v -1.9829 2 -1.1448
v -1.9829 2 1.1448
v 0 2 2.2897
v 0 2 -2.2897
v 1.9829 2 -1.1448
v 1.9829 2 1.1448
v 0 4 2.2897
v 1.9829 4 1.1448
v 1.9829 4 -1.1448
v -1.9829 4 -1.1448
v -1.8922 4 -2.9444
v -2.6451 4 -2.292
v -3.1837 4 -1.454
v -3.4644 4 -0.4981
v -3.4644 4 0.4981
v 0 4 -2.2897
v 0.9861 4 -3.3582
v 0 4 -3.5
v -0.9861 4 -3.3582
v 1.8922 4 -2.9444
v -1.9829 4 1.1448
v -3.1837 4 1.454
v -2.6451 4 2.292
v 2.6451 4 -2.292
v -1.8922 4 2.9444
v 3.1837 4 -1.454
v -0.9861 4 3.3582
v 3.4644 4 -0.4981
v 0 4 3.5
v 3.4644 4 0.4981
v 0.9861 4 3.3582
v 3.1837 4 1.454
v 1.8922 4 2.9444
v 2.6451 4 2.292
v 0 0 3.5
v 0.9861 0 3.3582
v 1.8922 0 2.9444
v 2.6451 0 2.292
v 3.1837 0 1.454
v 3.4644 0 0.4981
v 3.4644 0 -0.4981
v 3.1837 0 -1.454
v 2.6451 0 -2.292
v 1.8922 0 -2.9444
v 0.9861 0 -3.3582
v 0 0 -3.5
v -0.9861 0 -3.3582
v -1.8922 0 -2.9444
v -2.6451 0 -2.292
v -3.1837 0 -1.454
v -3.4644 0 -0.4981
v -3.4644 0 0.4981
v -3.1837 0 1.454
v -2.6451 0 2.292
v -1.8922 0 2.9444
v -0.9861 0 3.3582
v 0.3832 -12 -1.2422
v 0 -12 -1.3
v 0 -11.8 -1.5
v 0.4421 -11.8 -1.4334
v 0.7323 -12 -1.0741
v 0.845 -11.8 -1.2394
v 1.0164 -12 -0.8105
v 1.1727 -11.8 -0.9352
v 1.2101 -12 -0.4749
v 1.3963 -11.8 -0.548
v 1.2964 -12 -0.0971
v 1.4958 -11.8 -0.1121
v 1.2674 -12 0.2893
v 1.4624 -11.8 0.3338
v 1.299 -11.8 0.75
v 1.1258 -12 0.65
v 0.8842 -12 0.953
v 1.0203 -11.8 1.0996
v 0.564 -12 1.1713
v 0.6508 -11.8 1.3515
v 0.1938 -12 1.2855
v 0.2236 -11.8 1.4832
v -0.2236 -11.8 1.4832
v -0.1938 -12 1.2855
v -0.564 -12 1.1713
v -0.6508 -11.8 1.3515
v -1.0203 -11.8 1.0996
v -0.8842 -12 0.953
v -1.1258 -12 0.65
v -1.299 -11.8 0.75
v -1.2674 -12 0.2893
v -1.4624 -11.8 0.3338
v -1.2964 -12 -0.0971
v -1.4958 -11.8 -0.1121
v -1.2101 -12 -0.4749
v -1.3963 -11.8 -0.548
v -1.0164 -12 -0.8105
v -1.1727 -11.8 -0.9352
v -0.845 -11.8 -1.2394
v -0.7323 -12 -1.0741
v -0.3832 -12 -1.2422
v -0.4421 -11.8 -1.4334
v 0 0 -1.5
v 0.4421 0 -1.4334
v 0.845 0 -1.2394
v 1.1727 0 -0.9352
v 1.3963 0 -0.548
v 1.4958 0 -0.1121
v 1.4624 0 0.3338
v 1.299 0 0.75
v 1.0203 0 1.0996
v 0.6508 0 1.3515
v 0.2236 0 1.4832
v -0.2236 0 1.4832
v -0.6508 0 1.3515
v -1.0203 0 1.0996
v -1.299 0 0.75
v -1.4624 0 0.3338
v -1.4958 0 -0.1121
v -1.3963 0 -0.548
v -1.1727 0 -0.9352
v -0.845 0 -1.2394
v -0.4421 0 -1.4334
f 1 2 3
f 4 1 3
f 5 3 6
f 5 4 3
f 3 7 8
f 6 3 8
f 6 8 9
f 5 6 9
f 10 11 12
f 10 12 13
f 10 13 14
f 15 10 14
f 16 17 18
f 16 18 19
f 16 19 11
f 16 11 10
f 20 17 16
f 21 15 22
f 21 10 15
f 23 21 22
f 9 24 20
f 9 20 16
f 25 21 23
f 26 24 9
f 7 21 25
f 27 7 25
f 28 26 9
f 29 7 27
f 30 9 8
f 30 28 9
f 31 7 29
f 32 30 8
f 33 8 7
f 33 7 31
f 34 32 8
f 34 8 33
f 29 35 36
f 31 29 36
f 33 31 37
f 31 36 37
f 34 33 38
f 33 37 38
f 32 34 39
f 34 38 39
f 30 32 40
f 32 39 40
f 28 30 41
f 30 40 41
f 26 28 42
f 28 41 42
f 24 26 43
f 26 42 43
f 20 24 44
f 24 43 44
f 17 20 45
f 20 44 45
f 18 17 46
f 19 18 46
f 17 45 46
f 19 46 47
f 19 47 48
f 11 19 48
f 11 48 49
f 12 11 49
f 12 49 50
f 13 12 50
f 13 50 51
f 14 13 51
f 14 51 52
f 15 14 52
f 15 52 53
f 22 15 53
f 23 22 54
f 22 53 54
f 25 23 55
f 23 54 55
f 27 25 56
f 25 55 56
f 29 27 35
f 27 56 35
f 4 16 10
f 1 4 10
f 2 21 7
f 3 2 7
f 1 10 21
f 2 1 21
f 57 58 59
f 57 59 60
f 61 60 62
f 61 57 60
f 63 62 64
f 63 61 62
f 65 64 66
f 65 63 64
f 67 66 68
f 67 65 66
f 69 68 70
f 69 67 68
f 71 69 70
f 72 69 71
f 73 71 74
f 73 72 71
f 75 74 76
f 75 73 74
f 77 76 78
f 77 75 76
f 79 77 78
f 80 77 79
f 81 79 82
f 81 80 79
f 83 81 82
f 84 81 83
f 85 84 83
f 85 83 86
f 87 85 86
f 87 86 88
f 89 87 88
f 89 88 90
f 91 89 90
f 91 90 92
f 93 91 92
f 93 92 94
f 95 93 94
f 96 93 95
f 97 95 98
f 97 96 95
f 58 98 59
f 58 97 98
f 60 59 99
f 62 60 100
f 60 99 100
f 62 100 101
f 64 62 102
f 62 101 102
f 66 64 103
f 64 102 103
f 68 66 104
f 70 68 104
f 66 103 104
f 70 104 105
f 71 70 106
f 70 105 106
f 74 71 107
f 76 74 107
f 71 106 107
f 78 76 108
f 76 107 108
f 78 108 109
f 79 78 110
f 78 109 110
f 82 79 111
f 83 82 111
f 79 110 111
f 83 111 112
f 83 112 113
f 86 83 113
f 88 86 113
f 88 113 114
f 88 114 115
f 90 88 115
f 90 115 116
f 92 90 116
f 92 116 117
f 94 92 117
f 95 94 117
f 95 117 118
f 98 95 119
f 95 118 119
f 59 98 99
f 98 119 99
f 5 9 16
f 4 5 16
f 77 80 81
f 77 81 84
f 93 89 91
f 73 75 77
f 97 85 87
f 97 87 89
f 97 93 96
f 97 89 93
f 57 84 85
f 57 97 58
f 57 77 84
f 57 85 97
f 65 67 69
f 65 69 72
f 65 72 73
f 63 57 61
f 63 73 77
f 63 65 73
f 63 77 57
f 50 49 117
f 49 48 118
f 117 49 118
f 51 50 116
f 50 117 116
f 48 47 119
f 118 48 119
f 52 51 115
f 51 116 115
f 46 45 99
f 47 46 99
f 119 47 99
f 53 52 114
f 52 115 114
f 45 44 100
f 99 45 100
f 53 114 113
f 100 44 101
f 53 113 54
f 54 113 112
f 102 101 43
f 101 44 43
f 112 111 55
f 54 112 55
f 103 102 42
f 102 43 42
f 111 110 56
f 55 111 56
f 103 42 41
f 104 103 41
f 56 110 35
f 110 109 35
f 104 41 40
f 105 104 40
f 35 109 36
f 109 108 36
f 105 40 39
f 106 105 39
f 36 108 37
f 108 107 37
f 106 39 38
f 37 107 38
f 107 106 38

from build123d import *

# Parameters (mm, degrees)
CROQUIS1_R              = 3.5
SALIENTE_EXTRUIR1_DEPTH = 4
CROQUIS2_R              = 1.5
SALIENTE_EXTRUIR2_DEPTH = 12
CHAFL_N1_SIZE           = 0.2
CORTAR_EXTRUIR1_DEPTH   = 2


with BuildPart() as part:
    # Croquis1 → Saliente-Extruir1 (new body)
    with BuildSketch(Plane(origin=(0, 0, 0), x_dir=(1, 0, 0), z_dir=(0, 1, 0))):
        with Locations(Location((0, 0, 0), (0, 0, 270))):
            Circle(CROQUIS1_R)
    extrude(amount=SALIENTE_EXTRUIR1_DEPTH)

    # Croquis2 → Saliente-Extruir2 (add)
    with BuildSketch(Plane.XZ):
        with Locations(Location((0, 0, 0), (0, 0, 270))):
            Circle(CROQUIS2_R)
    extrude(amount=SALIENTE_EXTRUIR2_DEPTH)

    # Chaflán1
    chafl_n1_edges = [part.edges().sort_by_distance(p)[0] for p in [
        (0, -12, 1.5),
    ]]
    chamfer(chafl_n1_edges, length=CHAFL_N1_SIZE)

    # Croquis3 → Cortar-Extruir1 (cut)
    with BuildSketch(Plane(origin=(0, 4, 0), x_dir=(1, 0, 0), z_dir=(0, 1, 0))):
        Polygon((0, 2.289686923), (-1.982927042, 1.144843462), (-1.982927042, -1.144843462), (0, -2.289686923), (1.982927042, -1.144843462), (1.982927042, 1.144843462), align=None)
    extrude(amount=-CORTAR_EXTRUIR1_DEPTH, mode=Mode.SUBTRACT)


solid = part.part
